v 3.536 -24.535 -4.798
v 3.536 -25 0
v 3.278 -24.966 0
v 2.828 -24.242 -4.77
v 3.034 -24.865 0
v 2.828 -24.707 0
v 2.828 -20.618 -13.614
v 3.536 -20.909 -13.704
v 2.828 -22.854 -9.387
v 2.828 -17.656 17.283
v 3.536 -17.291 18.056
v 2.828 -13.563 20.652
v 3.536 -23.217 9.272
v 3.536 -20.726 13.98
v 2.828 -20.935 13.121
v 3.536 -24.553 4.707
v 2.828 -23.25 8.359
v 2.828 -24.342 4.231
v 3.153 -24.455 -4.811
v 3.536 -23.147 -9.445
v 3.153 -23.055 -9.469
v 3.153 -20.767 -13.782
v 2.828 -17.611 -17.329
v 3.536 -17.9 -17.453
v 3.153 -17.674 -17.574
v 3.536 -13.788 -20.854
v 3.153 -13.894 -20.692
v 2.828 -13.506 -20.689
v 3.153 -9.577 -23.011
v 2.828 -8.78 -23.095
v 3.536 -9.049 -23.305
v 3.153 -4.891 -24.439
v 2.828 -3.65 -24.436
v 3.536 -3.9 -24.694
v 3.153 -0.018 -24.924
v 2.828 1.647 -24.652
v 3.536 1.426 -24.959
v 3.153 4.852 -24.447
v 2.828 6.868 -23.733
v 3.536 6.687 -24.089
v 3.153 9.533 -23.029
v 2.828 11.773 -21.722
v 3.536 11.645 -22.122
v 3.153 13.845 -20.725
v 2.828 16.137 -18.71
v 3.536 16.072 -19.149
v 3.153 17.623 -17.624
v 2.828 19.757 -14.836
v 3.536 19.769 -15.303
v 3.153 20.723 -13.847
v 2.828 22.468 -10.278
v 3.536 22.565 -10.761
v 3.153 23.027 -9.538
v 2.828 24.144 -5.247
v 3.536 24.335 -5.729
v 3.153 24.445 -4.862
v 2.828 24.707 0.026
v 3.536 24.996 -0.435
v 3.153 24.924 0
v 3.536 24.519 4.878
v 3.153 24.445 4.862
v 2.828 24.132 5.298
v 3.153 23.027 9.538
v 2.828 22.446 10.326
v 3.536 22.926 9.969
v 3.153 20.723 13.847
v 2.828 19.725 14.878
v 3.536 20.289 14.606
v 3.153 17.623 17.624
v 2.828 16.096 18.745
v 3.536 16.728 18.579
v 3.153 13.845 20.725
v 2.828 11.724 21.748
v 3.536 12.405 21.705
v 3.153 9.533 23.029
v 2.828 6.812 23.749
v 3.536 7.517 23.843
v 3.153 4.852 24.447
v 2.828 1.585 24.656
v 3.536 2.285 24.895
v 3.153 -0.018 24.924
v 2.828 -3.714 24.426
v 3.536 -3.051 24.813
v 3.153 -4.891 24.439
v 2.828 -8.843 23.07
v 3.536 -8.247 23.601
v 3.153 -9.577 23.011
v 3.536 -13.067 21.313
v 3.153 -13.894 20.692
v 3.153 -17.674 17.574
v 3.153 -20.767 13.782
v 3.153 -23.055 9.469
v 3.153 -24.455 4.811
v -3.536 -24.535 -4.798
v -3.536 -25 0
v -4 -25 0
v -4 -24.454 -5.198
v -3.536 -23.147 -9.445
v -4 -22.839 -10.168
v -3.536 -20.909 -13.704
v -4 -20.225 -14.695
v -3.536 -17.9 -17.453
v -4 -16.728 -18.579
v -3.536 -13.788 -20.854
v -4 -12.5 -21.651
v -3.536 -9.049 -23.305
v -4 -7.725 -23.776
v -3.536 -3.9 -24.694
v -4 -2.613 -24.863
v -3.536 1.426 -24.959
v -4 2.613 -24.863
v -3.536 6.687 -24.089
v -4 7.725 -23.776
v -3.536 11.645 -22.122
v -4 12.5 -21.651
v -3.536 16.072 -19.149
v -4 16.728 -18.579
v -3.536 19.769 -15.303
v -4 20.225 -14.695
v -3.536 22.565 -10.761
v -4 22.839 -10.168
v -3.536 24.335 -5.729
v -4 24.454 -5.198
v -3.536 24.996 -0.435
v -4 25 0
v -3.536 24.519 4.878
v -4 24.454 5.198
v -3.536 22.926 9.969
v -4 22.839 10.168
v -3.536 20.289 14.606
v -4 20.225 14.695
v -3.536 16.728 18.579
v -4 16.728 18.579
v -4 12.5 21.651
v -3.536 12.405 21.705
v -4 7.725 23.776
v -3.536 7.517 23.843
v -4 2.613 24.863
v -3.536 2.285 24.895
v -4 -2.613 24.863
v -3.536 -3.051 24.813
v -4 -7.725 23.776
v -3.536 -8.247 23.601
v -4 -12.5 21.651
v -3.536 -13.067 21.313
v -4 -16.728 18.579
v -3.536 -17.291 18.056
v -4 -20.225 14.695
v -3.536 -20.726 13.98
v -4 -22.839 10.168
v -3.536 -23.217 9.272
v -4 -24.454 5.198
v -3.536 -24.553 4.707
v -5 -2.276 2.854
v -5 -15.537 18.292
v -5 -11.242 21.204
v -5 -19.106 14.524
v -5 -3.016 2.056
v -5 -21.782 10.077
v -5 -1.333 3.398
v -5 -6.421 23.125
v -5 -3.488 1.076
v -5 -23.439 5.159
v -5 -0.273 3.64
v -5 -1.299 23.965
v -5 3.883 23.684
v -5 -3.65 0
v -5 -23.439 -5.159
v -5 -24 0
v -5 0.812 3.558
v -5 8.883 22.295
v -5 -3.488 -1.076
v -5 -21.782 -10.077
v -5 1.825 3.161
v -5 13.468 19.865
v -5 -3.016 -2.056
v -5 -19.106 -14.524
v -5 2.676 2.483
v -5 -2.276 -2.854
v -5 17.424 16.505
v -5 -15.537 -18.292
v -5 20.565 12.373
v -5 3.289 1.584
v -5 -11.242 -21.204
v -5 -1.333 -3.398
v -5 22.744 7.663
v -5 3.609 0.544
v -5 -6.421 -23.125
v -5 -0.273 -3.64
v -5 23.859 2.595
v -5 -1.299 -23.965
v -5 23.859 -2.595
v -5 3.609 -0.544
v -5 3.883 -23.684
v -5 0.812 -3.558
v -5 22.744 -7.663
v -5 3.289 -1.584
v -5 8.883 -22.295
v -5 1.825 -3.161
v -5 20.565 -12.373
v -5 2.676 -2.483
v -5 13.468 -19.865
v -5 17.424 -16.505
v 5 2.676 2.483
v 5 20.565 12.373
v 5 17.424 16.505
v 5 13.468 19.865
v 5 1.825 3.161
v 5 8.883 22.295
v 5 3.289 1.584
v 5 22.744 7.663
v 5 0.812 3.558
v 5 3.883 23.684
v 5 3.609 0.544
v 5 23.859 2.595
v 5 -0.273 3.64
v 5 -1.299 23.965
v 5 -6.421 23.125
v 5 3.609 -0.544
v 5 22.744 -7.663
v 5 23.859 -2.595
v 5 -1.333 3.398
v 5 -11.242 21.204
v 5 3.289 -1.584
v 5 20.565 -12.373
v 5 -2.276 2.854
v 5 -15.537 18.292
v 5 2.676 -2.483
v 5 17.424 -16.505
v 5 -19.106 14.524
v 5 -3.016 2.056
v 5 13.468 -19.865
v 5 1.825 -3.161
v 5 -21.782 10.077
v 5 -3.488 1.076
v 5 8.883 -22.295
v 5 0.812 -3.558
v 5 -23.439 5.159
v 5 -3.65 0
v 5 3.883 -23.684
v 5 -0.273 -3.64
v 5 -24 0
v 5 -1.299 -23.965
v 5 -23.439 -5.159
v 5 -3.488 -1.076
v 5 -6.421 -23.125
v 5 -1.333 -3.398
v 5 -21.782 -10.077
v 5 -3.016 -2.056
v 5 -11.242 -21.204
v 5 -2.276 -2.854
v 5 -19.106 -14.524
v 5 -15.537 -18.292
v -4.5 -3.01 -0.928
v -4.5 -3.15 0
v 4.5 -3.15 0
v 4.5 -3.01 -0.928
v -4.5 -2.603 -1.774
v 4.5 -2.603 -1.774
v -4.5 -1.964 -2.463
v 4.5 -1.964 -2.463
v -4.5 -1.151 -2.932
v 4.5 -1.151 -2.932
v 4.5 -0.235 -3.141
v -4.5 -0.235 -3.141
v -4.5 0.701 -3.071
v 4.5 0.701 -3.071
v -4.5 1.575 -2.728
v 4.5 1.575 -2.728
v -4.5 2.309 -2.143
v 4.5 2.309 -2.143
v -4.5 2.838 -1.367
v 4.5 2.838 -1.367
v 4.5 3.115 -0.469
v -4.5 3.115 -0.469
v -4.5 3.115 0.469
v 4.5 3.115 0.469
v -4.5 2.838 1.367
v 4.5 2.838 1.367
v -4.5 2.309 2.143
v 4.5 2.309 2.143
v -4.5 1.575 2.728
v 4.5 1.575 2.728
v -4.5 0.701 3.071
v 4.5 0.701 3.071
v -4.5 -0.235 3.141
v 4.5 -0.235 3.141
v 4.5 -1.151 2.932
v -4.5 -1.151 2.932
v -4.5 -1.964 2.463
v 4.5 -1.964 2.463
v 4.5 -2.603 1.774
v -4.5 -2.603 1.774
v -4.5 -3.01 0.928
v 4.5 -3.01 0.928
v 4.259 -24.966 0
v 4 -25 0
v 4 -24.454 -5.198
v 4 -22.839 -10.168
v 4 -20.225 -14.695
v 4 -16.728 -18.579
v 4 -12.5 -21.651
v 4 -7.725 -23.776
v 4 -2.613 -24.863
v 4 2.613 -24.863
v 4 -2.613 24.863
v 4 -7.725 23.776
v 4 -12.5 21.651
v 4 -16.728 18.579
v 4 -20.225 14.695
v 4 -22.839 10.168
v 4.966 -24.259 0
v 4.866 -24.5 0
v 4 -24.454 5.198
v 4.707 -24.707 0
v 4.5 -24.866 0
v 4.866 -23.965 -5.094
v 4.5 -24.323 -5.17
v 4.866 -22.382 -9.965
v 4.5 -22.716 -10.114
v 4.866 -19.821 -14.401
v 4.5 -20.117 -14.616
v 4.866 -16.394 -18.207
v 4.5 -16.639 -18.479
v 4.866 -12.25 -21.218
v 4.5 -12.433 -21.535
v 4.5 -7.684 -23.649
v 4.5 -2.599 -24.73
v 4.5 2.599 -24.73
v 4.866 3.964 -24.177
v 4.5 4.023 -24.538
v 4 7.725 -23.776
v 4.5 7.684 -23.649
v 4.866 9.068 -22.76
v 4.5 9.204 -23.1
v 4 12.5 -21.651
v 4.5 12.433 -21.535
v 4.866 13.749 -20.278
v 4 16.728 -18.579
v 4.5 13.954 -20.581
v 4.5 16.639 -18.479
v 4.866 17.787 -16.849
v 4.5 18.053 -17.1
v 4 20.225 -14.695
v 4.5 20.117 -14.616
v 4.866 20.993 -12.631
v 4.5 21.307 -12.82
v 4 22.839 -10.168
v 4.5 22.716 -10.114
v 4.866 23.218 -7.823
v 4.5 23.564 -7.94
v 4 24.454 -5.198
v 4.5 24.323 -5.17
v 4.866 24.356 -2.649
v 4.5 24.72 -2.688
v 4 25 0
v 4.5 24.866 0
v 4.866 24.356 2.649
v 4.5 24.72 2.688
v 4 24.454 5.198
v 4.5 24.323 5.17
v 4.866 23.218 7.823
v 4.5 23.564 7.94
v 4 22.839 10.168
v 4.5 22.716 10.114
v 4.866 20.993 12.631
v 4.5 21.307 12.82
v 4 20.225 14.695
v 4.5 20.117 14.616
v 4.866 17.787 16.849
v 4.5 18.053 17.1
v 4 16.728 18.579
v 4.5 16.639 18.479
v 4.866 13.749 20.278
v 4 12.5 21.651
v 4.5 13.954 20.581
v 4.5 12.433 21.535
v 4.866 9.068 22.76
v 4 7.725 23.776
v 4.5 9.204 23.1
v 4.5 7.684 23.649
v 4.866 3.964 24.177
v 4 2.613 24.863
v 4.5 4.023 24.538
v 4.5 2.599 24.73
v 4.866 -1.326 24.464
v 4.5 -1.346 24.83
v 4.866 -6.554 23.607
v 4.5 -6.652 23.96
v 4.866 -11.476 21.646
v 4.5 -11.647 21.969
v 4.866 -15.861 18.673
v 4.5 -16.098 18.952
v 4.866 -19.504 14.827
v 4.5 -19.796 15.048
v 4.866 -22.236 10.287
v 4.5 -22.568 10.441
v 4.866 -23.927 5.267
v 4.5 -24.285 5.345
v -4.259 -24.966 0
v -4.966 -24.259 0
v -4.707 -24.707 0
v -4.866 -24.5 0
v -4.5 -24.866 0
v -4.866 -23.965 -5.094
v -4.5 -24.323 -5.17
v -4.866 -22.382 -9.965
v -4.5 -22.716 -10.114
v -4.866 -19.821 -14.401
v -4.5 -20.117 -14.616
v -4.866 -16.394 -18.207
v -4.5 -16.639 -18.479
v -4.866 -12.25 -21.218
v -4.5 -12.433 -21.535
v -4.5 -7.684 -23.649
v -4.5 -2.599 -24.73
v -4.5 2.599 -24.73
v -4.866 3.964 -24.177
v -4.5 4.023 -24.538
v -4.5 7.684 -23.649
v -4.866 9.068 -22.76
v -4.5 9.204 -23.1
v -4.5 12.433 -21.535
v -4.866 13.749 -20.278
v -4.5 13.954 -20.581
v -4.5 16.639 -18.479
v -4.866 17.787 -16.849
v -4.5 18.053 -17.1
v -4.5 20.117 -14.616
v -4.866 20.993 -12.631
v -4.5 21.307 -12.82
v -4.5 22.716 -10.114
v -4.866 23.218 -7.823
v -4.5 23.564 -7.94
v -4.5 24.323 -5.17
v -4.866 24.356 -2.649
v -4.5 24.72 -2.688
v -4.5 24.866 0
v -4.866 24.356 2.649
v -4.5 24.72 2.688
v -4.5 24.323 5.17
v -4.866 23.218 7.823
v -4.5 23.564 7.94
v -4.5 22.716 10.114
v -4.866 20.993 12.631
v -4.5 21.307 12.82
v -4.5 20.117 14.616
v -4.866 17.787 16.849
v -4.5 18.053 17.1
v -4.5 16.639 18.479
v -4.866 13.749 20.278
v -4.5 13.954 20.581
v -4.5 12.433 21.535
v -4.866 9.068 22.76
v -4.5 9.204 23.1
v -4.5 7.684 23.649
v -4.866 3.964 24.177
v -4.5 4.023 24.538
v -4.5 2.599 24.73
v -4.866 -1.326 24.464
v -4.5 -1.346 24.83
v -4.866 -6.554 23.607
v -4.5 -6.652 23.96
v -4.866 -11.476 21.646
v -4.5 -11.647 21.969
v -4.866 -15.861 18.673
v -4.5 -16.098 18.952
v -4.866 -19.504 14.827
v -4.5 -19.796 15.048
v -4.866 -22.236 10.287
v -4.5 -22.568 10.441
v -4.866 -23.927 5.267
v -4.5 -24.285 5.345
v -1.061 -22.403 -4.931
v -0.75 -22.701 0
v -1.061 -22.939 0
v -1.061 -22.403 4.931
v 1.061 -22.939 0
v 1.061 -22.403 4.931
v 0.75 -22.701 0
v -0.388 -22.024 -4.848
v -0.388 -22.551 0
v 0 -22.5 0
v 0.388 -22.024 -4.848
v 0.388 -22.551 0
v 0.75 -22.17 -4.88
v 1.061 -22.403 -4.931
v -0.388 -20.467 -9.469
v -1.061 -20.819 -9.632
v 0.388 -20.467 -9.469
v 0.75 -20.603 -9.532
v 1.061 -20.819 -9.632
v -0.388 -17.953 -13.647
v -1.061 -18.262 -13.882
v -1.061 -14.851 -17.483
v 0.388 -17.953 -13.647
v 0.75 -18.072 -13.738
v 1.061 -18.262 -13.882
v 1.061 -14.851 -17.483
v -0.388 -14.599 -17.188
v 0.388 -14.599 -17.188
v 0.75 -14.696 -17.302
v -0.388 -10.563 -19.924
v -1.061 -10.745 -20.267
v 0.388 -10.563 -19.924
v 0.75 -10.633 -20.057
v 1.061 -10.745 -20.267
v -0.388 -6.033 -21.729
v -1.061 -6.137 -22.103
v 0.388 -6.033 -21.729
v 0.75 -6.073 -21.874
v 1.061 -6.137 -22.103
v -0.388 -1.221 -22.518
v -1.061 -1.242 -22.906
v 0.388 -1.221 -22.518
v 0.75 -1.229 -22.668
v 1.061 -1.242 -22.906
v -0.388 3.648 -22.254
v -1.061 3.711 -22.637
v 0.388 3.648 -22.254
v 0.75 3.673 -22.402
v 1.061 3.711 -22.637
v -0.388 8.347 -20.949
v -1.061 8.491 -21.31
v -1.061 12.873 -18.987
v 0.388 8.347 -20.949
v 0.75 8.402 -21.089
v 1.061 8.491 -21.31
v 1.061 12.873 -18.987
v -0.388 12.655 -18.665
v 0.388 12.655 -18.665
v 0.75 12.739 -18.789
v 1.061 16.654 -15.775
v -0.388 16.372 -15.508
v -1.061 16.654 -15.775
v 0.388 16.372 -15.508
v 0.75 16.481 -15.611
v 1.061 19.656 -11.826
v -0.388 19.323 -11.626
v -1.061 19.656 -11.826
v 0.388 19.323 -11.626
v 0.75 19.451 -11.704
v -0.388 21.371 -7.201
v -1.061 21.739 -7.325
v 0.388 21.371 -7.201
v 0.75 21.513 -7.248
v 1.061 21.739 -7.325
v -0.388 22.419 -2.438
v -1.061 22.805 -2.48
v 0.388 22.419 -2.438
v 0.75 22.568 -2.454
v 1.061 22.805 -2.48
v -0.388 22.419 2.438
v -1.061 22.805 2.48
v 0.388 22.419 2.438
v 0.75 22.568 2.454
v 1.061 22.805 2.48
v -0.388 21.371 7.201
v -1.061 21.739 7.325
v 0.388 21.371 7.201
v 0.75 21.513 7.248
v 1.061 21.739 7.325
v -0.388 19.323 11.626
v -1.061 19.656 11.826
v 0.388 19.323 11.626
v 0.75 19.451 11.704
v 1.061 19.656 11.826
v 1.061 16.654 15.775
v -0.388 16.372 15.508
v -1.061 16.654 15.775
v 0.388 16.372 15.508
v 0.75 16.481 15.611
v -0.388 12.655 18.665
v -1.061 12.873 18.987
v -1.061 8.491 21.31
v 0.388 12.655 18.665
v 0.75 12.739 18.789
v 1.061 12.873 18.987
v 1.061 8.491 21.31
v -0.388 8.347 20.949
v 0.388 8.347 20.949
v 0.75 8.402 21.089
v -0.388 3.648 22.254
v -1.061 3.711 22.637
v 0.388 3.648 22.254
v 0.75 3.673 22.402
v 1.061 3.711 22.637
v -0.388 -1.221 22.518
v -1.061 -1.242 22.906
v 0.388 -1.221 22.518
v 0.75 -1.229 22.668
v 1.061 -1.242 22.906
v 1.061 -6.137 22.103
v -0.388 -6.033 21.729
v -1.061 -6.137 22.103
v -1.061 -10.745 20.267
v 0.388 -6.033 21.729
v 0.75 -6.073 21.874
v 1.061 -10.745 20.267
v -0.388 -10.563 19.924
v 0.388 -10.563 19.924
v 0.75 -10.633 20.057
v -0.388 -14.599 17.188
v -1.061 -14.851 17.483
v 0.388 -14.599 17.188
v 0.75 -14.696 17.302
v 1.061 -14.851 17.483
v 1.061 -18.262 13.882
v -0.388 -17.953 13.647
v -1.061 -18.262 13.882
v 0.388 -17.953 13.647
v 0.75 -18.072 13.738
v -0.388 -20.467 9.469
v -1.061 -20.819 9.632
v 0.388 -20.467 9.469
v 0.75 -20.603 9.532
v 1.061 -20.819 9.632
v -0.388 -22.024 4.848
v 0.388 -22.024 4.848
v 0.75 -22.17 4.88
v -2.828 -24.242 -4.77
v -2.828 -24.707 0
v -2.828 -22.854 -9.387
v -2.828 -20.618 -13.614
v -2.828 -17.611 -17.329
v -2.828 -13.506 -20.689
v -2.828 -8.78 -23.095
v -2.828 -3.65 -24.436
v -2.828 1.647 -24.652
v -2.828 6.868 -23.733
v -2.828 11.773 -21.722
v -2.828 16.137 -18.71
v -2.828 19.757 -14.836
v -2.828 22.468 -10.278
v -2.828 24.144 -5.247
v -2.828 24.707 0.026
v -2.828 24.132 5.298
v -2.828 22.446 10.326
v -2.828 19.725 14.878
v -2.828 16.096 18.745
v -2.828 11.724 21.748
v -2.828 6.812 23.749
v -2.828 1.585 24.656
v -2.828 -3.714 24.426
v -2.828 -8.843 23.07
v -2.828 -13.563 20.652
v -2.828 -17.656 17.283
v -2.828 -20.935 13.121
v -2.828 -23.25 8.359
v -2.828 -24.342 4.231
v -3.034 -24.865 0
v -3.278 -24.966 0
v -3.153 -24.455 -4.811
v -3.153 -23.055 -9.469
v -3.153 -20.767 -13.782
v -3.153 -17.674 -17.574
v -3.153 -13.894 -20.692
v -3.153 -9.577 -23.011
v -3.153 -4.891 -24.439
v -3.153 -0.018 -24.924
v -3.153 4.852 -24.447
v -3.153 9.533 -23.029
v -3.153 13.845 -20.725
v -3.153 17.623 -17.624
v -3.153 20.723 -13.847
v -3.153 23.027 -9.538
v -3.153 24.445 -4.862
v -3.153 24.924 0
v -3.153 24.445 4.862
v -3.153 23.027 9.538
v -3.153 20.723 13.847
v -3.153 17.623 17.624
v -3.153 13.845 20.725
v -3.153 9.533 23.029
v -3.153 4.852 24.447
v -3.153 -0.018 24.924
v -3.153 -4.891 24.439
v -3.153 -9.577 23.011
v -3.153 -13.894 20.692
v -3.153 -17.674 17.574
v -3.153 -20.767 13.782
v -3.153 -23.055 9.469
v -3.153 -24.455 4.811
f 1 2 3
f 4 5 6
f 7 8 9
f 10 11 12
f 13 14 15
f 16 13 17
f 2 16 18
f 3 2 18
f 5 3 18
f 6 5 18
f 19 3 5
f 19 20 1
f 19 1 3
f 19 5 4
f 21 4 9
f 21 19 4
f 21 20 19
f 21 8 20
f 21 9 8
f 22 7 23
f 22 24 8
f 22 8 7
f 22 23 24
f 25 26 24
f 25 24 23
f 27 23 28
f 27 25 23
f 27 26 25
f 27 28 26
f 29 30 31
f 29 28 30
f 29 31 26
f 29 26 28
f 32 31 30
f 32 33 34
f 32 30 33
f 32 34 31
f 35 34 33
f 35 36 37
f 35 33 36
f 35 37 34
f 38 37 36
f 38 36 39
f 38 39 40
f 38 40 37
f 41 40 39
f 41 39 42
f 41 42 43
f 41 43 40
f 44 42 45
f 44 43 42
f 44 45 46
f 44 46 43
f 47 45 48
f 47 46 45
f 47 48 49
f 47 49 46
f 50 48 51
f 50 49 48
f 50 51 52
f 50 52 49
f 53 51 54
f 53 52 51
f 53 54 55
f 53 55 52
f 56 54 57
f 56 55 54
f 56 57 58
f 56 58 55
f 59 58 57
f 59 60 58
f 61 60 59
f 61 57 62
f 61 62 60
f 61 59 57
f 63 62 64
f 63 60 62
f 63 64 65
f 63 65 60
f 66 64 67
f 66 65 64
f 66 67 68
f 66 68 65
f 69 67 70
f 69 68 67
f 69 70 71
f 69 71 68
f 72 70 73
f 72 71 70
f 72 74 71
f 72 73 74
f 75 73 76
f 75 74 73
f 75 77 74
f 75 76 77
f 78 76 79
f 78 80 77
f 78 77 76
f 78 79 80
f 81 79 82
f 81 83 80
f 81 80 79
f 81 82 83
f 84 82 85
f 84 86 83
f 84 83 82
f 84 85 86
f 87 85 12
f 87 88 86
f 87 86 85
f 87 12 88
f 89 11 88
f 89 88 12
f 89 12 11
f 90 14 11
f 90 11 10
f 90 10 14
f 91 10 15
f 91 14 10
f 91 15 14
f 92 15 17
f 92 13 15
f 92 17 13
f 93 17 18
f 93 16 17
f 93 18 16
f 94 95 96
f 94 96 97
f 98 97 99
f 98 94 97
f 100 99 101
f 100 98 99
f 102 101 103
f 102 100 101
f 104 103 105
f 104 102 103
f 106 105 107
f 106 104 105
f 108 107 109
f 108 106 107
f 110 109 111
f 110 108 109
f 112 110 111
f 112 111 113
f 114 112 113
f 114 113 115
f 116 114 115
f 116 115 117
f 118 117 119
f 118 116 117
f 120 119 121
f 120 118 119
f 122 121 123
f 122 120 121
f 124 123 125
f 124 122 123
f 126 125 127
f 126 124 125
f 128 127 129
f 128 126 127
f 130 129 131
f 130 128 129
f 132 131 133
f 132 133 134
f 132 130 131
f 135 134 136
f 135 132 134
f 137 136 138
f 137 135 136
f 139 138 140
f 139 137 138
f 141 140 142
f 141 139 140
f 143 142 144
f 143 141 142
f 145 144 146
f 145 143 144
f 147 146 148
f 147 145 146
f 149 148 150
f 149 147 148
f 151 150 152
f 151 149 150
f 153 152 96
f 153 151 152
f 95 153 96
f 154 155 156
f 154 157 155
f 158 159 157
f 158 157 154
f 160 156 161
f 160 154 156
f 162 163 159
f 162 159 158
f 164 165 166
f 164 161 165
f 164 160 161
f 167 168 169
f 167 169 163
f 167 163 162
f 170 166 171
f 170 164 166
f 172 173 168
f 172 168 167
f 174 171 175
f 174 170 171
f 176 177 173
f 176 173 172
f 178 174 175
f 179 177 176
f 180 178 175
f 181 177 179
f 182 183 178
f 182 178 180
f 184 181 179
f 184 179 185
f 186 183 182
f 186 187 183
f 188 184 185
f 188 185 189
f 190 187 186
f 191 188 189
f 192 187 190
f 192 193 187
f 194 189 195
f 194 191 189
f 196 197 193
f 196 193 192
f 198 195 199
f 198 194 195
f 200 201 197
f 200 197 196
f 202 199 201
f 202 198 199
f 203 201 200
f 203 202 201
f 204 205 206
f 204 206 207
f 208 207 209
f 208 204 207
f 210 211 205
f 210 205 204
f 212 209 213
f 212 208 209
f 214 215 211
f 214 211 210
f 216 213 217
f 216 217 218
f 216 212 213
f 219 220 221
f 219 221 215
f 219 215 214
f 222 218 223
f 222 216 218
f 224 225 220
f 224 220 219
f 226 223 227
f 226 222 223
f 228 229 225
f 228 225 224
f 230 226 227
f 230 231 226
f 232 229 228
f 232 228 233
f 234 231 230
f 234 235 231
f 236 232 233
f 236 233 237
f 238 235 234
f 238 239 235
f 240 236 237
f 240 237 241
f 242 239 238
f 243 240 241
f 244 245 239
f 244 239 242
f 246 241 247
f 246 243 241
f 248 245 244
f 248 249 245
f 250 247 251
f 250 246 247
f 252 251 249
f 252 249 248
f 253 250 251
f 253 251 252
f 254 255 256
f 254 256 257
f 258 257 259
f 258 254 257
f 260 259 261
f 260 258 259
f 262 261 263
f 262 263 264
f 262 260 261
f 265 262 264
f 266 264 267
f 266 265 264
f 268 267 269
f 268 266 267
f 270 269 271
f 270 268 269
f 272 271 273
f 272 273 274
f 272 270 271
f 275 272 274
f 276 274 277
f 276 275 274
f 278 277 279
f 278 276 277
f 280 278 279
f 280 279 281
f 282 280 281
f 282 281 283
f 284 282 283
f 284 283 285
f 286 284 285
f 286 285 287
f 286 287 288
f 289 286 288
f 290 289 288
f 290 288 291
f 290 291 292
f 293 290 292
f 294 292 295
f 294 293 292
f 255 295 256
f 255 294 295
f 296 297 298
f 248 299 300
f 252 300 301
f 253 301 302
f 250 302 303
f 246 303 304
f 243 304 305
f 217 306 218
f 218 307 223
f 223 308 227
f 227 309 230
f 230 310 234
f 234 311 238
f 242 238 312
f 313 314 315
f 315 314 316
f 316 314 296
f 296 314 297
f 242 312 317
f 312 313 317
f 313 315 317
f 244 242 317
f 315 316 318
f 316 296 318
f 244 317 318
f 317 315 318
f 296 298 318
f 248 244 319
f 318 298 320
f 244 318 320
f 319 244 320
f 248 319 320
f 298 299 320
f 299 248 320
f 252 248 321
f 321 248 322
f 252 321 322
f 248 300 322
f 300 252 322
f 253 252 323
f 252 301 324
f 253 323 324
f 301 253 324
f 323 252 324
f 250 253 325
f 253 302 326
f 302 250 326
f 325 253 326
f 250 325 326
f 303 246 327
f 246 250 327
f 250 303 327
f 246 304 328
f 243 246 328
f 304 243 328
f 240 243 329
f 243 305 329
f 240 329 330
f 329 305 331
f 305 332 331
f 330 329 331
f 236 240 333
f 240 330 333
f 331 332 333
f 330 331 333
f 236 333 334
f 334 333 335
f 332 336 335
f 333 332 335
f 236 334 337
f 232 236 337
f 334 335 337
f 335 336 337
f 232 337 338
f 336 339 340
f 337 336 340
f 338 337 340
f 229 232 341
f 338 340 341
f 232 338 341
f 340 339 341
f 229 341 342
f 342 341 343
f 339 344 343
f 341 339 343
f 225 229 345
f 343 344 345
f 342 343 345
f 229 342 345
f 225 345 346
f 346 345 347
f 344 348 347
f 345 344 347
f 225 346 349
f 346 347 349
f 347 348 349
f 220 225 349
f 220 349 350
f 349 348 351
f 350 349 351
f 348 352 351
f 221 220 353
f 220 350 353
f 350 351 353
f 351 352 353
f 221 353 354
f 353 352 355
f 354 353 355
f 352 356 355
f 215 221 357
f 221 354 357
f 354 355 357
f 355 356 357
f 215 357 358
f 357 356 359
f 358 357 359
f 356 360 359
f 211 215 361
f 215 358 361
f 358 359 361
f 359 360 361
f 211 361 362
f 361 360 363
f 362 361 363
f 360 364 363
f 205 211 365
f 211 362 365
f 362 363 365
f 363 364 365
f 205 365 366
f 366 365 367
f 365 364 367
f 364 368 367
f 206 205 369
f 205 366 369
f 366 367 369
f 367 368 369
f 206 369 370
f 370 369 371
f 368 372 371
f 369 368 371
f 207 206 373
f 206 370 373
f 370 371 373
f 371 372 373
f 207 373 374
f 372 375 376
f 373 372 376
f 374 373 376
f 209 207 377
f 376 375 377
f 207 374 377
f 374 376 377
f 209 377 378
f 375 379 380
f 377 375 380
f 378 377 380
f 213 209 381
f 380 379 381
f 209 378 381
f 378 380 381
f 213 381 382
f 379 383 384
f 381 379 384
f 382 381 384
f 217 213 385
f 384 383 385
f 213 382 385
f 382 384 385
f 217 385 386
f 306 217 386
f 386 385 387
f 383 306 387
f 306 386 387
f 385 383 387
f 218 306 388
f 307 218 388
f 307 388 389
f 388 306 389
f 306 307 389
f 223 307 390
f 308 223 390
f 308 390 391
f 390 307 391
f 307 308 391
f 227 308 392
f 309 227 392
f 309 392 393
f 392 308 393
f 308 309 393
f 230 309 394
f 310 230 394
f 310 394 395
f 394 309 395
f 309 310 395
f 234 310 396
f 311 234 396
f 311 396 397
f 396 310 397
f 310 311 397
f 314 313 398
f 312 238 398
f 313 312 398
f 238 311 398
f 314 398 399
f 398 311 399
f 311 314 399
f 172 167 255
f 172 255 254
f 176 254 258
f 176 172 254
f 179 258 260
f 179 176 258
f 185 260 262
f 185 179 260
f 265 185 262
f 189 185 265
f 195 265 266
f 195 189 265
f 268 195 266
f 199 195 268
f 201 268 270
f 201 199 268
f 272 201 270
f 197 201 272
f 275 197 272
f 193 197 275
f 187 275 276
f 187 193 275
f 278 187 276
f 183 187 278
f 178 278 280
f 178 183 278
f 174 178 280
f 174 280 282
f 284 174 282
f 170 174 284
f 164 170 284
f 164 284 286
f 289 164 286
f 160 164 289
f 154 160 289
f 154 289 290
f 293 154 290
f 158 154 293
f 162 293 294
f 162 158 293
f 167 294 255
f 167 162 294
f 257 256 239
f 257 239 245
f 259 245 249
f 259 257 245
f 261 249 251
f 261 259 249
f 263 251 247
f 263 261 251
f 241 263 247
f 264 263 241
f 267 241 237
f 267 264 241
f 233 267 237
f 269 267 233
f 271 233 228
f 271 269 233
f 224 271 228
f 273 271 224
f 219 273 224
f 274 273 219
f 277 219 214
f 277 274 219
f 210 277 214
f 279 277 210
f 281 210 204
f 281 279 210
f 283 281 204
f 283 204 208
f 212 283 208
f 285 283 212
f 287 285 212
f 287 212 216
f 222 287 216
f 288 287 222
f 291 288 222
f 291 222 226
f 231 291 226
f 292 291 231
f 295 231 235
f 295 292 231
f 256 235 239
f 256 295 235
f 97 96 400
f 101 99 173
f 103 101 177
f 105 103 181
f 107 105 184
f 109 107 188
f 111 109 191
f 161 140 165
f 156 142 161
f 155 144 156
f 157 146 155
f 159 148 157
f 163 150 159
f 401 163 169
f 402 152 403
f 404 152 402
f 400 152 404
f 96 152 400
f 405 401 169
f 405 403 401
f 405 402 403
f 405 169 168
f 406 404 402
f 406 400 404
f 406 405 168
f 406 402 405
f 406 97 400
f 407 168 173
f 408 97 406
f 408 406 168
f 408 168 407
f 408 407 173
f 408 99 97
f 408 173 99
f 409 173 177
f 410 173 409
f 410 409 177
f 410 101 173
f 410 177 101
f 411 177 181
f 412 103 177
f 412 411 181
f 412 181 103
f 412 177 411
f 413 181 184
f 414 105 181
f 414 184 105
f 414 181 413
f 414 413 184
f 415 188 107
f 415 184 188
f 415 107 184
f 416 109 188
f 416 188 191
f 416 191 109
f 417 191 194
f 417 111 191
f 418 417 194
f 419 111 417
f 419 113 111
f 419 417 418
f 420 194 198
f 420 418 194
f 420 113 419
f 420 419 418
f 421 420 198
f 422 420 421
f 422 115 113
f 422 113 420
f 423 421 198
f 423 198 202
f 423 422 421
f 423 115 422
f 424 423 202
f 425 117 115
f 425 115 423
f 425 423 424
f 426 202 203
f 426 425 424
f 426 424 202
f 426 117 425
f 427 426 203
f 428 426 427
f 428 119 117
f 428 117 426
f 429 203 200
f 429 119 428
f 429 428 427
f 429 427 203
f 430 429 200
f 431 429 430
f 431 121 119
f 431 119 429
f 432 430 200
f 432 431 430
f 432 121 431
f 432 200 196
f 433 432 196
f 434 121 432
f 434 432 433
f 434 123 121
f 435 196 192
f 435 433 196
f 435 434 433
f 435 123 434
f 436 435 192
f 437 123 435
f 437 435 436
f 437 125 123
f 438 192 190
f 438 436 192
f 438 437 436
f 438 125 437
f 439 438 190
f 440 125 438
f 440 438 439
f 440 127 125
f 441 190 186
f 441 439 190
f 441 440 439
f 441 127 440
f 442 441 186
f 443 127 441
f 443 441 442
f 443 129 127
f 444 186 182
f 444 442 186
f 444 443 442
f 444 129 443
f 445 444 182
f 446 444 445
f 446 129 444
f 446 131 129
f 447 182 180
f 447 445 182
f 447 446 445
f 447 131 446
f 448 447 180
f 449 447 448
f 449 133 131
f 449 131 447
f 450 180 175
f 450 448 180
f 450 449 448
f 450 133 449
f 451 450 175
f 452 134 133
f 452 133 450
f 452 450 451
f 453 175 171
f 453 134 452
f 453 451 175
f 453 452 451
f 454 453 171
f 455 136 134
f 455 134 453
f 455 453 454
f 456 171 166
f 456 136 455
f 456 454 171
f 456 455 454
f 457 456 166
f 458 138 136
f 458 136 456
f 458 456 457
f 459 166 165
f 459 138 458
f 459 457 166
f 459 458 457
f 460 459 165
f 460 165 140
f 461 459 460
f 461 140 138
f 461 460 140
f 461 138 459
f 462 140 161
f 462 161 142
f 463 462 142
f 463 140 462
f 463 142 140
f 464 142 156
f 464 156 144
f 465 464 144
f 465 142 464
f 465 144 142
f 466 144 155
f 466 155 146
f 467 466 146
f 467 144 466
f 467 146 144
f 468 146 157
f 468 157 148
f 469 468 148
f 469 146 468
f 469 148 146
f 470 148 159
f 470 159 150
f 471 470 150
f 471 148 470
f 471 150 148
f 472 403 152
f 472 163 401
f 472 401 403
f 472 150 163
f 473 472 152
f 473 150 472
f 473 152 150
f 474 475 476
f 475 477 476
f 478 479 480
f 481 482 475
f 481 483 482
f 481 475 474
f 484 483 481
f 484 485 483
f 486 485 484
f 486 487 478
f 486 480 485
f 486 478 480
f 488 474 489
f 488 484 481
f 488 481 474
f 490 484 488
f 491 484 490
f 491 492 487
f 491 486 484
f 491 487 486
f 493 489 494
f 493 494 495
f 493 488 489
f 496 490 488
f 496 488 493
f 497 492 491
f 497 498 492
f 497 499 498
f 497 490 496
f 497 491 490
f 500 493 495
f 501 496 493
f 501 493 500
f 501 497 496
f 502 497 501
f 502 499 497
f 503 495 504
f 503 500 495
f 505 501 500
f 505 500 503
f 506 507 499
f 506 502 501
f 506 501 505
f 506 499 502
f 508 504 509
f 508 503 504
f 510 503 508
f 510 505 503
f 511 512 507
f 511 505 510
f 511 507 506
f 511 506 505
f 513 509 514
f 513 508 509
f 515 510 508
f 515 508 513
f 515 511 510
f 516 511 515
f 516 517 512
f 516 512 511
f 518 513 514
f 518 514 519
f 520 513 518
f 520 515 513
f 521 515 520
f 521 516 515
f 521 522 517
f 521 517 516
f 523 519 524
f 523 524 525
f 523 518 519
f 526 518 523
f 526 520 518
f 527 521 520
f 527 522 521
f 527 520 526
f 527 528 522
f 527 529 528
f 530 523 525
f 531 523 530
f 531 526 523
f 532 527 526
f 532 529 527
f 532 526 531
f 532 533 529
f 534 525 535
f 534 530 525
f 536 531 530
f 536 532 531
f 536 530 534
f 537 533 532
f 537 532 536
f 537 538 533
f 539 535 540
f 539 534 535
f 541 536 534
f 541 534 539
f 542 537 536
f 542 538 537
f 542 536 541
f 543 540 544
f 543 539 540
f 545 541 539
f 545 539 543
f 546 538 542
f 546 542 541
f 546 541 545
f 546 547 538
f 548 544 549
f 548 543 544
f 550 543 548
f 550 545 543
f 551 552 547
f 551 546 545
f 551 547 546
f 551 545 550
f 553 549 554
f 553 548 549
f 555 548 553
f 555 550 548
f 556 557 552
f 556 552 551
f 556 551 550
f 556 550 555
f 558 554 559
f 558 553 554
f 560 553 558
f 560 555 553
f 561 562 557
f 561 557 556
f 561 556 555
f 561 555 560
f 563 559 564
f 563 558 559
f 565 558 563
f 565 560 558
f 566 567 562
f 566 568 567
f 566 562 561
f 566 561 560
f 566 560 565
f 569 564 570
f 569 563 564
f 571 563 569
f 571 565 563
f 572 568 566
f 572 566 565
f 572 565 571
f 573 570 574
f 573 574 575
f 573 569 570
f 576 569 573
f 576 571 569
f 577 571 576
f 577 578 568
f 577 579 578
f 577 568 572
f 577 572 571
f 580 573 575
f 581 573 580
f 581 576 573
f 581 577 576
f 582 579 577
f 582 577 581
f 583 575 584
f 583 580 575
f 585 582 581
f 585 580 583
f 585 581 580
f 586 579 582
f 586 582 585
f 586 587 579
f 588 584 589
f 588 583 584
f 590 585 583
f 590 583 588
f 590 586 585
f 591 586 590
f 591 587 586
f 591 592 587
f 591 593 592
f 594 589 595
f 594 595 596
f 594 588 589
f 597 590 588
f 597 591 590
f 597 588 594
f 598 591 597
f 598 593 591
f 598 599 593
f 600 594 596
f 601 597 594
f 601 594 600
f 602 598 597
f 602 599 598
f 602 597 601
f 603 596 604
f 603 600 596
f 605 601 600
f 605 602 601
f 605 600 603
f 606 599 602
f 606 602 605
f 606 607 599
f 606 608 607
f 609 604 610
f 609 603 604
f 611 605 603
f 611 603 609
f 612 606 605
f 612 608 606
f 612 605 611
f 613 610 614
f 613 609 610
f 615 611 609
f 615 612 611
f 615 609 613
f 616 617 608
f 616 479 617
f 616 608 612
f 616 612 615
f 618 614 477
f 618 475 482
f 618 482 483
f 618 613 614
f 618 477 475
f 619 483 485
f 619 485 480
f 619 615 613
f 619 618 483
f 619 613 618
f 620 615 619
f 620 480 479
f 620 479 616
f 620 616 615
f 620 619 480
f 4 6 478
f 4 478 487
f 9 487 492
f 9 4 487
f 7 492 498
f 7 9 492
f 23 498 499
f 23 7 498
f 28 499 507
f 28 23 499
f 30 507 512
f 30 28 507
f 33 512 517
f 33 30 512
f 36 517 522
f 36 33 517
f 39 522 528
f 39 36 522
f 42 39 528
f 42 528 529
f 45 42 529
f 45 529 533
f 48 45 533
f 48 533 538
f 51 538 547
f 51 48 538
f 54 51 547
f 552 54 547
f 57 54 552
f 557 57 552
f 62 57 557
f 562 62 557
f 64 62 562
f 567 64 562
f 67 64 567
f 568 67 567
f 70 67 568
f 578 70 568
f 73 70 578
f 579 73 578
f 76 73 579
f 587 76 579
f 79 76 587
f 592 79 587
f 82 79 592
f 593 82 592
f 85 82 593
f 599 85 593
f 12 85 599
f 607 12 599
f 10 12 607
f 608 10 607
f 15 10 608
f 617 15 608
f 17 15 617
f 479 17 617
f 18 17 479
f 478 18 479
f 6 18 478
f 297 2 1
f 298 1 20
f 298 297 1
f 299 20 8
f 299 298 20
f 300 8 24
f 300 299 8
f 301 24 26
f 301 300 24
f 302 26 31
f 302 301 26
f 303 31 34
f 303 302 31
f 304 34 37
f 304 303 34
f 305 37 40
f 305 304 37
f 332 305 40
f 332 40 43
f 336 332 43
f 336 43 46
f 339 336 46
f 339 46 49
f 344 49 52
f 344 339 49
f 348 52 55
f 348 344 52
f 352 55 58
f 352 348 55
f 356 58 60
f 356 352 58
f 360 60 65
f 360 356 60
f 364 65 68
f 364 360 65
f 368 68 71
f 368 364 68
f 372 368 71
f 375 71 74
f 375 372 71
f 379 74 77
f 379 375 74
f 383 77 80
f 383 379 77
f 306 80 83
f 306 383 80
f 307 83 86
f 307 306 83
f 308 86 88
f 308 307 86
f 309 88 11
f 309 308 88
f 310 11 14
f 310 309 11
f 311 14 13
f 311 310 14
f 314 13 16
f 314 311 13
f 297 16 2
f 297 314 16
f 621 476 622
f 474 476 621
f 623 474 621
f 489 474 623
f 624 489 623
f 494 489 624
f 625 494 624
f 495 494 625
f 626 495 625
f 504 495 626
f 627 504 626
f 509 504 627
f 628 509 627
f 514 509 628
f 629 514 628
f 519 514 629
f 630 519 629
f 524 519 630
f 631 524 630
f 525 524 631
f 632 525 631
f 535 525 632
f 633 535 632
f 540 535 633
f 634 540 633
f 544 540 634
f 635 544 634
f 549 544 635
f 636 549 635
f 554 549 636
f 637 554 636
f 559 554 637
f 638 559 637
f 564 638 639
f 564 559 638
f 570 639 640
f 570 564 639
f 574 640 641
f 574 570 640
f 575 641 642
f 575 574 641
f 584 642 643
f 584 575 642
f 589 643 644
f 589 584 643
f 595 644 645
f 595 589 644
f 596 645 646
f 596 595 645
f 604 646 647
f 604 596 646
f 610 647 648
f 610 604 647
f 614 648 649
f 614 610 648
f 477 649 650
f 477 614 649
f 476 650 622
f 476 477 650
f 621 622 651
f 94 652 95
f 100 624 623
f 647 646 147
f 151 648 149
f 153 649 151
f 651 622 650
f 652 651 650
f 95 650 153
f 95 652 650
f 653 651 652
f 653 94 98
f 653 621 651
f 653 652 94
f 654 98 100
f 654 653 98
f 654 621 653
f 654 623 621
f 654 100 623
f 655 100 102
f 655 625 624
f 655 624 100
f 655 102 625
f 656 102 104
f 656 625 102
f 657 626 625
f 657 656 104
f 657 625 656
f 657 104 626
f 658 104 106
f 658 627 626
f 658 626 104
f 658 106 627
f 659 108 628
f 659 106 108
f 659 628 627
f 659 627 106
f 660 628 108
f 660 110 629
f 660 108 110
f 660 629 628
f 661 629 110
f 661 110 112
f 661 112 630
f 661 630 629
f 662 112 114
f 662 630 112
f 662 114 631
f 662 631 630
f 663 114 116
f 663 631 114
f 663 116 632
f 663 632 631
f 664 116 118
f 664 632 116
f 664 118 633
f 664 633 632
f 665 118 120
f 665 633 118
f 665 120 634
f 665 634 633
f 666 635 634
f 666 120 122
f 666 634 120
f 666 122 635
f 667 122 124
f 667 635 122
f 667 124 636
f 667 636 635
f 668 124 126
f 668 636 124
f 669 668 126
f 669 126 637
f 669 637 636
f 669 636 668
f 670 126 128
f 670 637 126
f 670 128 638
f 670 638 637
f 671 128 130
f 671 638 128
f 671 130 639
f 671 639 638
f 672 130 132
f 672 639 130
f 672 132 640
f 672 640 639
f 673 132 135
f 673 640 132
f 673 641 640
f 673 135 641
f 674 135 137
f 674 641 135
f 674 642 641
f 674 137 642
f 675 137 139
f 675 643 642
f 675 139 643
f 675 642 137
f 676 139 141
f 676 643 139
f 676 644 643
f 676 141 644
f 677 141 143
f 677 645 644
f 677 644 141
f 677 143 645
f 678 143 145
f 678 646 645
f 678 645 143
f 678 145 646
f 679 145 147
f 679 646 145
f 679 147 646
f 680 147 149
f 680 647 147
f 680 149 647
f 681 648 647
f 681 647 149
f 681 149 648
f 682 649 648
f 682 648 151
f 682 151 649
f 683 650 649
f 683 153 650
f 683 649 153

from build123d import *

# Parameters (mm, degrees)
CHANFREIN1_SIZE = 0.5
CONG_1_R        = 1


with BuildPart() as part:
    # Esquisse2 → Révolution1 (revolve)
    with BuildSketch(Plane.XY, mode=Mode.PRIVATE) as r_volution1_sk:
        with BuildLine():
            Line((3.121320344, 25), (5, 25))
            Line((5, 25), (5, 3.15))
            Line((5, 3.15), (-5, 3.15))
            Line((-5, 3.15), (-5, 25))
            Line((-5, 25), (-3.121320344, 25))
            Line((-3.121320344, 25), (-1.060660172, 22.939339828))
            ThreePointArc((-1.060660172, 22.939339828), (0, 22.5), (1.060660172, 22.939339828))
            Line((1.060660172, 22.939339828), (3.121320344, 25))
        make_face()
    revolve(r_volution1_sk.sketch.rotate(Axis((-80.838467618, 0, 0), (1, 0, 0)), 180), axis=Axis((-80.838467618, 0, 0), (1, 0, 0)))

    # Chanfrein1
    chanfrein1_edges = [part.edges().sort_by_distance(p)[0] for p in [
        (5, 3.15, 0),
        (-5, 3.15, 0),
    ]]
    chamfer(chanfrein1_edges, length=CHANFREIN1_SIZE)

    # Congé1
    cong_1_edges = [part.edges().sort_by_distance(p)[0] for p in [
        (3.121320344, 25, 0),
        (5, 25, 0),
        (-5, 25, 0),
        (-3.121320344, 25, 0),
    ]]
    fillet(cong_1_edges, radius=CONG_1_R)


solid = part.part
